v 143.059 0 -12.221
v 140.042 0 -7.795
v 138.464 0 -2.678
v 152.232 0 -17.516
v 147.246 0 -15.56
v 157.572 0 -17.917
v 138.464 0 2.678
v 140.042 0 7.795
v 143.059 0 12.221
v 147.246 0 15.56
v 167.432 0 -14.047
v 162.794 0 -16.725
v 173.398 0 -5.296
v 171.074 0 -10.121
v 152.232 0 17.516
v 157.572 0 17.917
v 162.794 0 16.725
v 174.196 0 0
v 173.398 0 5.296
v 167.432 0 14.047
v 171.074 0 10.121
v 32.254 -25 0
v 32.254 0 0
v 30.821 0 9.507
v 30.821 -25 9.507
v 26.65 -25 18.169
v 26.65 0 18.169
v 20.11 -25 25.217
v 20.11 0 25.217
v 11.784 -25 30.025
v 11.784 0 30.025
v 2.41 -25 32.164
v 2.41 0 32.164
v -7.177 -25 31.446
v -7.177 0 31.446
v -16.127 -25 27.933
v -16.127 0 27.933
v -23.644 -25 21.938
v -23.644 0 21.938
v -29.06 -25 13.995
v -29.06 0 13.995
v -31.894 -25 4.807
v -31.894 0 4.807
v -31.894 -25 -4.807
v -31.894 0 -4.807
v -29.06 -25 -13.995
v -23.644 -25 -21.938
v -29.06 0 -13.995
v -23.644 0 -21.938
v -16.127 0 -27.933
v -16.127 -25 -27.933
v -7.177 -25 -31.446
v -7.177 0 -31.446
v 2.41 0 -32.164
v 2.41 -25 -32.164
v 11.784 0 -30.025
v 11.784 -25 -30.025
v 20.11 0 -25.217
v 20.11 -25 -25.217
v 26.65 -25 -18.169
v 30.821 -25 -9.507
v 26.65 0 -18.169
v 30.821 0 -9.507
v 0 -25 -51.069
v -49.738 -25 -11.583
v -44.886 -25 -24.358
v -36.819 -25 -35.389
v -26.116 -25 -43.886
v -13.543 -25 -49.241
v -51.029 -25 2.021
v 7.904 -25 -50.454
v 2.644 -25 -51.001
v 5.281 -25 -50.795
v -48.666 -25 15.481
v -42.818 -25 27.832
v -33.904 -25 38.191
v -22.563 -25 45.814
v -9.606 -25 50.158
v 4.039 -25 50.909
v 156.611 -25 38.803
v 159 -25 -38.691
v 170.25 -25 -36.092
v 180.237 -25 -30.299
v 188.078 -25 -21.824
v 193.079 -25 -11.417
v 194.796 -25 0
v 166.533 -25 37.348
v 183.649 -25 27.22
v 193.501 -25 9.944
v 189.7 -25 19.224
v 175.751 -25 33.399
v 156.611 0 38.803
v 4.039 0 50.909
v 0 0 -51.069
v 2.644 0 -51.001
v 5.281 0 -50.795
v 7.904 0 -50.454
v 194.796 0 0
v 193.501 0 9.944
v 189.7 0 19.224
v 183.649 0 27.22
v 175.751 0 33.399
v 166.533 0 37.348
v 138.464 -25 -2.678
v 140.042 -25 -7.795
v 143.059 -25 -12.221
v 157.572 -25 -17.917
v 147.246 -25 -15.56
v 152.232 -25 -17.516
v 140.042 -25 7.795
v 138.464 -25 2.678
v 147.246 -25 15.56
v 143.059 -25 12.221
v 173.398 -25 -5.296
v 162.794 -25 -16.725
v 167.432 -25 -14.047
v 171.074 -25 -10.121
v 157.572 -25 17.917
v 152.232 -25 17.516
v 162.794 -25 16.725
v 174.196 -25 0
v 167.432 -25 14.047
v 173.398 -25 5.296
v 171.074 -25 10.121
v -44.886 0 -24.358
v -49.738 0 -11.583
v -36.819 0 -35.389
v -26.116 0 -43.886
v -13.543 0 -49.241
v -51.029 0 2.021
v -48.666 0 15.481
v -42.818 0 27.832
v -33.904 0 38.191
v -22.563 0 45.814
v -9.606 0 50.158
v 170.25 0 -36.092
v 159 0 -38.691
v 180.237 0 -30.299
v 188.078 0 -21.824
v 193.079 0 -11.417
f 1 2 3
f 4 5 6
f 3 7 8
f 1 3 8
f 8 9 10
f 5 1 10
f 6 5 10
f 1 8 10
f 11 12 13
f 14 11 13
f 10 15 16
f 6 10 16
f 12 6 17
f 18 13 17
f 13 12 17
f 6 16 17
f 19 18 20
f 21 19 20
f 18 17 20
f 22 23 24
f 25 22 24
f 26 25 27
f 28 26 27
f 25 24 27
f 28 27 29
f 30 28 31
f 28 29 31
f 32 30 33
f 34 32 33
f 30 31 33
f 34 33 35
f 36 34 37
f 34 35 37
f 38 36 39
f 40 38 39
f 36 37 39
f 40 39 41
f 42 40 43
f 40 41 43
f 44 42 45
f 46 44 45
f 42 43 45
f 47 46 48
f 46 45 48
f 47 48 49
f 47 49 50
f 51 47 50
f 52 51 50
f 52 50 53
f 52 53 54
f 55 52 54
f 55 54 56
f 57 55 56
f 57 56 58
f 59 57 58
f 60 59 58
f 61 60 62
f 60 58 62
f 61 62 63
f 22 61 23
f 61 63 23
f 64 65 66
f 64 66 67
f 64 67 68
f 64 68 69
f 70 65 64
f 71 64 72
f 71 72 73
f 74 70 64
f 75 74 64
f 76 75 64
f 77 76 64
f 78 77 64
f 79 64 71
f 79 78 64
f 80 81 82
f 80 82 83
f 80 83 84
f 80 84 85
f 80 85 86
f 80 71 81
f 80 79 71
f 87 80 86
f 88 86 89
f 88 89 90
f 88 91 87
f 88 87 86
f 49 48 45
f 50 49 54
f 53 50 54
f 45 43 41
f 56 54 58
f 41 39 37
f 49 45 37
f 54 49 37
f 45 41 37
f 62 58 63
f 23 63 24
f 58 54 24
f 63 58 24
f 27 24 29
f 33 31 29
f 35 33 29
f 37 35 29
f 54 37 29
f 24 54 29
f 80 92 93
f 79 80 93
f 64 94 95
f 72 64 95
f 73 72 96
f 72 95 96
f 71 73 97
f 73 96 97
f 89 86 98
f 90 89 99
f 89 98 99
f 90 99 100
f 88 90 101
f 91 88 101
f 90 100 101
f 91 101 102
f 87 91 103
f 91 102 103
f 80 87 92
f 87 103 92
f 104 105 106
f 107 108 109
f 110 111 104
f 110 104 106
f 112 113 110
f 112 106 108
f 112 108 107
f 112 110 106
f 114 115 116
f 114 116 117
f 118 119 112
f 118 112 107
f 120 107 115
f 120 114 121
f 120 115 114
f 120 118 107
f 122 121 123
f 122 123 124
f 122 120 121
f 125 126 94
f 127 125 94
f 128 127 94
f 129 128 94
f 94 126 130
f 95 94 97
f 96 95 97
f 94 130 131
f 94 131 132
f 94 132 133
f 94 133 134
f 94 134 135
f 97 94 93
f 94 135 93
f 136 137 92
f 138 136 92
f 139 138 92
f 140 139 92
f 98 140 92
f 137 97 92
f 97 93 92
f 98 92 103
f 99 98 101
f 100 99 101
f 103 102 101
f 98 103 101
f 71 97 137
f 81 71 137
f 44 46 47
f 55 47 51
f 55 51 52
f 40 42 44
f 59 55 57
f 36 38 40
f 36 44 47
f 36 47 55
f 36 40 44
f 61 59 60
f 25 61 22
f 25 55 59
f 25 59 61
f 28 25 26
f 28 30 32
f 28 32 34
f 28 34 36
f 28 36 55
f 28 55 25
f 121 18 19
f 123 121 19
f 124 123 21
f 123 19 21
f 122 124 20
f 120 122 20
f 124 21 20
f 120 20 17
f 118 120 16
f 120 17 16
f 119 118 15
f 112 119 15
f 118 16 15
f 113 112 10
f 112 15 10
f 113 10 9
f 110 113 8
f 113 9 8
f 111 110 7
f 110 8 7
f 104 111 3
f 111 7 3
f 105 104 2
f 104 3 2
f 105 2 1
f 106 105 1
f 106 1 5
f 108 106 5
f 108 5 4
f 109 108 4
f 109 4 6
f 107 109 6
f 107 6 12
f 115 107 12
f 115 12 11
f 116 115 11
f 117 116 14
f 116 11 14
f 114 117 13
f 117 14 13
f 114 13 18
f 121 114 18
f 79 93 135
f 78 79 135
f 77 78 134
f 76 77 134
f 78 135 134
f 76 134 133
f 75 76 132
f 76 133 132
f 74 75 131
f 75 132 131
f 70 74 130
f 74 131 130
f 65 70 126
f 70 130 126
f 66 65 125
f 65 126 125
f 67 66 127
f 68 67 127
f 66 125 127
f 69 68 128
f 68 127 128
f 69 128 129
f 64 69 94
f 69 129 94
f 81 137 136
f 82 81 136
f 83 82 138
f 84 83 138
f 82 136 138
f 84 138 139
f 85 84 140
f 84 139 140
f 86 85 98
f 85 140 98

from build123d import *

# Parameters (mm, degrees)
F2_DEPTH = 25
F1_R     = 17.9667597456
F1_R_2   = 32.2542560874


with BuildPart() as f2:
    # F0 (on Front) → F2 (new body)
    with BuildSketch(Plane.XZ):
        with BuildLine():
            ThreePointArc((194.7961708678, 0), (183.6489144795, 27.2202641338), (156.6110578322, 38.8029413899))
            ThreePointArc((156.6110578322, 38.8029413899), (117.1987235928, -1.1959369263), (159.0003047866, -38.690872137))
            ThreePointArc((159.0003047866, -38.690872137), (184.474618745, -26.3549218137), (194.7961708678, 0))
        make_face()
        with BuildLine():
            ThreePointArc((7.9035147854, -50.4537146304), (38.8050735772, -33.1995350967), (51.0690010277, 0))
            ThreePointArc((51.0690010277, 0), (37.5122251762, 34.6536553382), (4.0394604403, 50.9089935603))
            ThreePointArc((4.0394604403, 50.9089935603), (-51.028983482, 2.021314117), (0, -51.0690010277))
            Line((0, -51.0690010277), (7.9035147854, -50.4537146304))
        make_face()
        with BuildLine():
            ThreePointArc((4.0394604403, 50.9089935603), (37.5122251762, 34.6536553382), (51.0690010277, 0))
            ThreePointArc((51.0690010277, 0), (38.8050735772, -33.1995350967), (7.9035147854, -50.4537146304))
            Line((7.9035147854, -50.4537146304), (159.0003047866, -38.690872137))
            ThreePointArc((159.0003047866, -38.690872137), (117.1987235928, -1.1959369263), (156.6110578322, 38.8029413899))
            Line((156.6110578322, 38.8029413899), (4.0394604403, 50.9089935603))
        make_face()
        with BuildLine():
            ThreePointArc((0, -51.0690010277), (3.9637142718, -50.91494707), (7.9035147854, -50.4537146304))
            Line((7.9035147854, -50.4537146304), (0, -51.0690010277))
        make_face()
    extrude(amount=F2_DEPTH)


with BuildPart() as f2b:
    # F1 (on Front) → F2, piece 2 (new body)
    with BuildSketch(Plane.XZ):
        with Locations((156.2296152115, 0)):
            Circle(F1_R)
    extrude(amount=F2_DEPTH)


with BuildPart() as f2c:
    # F1 (on Front) → F2, piece 3 (new body)
    with BuildSketch(Plane.XZ):
        Circle(F1_R_2)
    extrude(amount=F2_DEPTH)


solid = Compound([f2.part, f2b.part, f2c.part])
